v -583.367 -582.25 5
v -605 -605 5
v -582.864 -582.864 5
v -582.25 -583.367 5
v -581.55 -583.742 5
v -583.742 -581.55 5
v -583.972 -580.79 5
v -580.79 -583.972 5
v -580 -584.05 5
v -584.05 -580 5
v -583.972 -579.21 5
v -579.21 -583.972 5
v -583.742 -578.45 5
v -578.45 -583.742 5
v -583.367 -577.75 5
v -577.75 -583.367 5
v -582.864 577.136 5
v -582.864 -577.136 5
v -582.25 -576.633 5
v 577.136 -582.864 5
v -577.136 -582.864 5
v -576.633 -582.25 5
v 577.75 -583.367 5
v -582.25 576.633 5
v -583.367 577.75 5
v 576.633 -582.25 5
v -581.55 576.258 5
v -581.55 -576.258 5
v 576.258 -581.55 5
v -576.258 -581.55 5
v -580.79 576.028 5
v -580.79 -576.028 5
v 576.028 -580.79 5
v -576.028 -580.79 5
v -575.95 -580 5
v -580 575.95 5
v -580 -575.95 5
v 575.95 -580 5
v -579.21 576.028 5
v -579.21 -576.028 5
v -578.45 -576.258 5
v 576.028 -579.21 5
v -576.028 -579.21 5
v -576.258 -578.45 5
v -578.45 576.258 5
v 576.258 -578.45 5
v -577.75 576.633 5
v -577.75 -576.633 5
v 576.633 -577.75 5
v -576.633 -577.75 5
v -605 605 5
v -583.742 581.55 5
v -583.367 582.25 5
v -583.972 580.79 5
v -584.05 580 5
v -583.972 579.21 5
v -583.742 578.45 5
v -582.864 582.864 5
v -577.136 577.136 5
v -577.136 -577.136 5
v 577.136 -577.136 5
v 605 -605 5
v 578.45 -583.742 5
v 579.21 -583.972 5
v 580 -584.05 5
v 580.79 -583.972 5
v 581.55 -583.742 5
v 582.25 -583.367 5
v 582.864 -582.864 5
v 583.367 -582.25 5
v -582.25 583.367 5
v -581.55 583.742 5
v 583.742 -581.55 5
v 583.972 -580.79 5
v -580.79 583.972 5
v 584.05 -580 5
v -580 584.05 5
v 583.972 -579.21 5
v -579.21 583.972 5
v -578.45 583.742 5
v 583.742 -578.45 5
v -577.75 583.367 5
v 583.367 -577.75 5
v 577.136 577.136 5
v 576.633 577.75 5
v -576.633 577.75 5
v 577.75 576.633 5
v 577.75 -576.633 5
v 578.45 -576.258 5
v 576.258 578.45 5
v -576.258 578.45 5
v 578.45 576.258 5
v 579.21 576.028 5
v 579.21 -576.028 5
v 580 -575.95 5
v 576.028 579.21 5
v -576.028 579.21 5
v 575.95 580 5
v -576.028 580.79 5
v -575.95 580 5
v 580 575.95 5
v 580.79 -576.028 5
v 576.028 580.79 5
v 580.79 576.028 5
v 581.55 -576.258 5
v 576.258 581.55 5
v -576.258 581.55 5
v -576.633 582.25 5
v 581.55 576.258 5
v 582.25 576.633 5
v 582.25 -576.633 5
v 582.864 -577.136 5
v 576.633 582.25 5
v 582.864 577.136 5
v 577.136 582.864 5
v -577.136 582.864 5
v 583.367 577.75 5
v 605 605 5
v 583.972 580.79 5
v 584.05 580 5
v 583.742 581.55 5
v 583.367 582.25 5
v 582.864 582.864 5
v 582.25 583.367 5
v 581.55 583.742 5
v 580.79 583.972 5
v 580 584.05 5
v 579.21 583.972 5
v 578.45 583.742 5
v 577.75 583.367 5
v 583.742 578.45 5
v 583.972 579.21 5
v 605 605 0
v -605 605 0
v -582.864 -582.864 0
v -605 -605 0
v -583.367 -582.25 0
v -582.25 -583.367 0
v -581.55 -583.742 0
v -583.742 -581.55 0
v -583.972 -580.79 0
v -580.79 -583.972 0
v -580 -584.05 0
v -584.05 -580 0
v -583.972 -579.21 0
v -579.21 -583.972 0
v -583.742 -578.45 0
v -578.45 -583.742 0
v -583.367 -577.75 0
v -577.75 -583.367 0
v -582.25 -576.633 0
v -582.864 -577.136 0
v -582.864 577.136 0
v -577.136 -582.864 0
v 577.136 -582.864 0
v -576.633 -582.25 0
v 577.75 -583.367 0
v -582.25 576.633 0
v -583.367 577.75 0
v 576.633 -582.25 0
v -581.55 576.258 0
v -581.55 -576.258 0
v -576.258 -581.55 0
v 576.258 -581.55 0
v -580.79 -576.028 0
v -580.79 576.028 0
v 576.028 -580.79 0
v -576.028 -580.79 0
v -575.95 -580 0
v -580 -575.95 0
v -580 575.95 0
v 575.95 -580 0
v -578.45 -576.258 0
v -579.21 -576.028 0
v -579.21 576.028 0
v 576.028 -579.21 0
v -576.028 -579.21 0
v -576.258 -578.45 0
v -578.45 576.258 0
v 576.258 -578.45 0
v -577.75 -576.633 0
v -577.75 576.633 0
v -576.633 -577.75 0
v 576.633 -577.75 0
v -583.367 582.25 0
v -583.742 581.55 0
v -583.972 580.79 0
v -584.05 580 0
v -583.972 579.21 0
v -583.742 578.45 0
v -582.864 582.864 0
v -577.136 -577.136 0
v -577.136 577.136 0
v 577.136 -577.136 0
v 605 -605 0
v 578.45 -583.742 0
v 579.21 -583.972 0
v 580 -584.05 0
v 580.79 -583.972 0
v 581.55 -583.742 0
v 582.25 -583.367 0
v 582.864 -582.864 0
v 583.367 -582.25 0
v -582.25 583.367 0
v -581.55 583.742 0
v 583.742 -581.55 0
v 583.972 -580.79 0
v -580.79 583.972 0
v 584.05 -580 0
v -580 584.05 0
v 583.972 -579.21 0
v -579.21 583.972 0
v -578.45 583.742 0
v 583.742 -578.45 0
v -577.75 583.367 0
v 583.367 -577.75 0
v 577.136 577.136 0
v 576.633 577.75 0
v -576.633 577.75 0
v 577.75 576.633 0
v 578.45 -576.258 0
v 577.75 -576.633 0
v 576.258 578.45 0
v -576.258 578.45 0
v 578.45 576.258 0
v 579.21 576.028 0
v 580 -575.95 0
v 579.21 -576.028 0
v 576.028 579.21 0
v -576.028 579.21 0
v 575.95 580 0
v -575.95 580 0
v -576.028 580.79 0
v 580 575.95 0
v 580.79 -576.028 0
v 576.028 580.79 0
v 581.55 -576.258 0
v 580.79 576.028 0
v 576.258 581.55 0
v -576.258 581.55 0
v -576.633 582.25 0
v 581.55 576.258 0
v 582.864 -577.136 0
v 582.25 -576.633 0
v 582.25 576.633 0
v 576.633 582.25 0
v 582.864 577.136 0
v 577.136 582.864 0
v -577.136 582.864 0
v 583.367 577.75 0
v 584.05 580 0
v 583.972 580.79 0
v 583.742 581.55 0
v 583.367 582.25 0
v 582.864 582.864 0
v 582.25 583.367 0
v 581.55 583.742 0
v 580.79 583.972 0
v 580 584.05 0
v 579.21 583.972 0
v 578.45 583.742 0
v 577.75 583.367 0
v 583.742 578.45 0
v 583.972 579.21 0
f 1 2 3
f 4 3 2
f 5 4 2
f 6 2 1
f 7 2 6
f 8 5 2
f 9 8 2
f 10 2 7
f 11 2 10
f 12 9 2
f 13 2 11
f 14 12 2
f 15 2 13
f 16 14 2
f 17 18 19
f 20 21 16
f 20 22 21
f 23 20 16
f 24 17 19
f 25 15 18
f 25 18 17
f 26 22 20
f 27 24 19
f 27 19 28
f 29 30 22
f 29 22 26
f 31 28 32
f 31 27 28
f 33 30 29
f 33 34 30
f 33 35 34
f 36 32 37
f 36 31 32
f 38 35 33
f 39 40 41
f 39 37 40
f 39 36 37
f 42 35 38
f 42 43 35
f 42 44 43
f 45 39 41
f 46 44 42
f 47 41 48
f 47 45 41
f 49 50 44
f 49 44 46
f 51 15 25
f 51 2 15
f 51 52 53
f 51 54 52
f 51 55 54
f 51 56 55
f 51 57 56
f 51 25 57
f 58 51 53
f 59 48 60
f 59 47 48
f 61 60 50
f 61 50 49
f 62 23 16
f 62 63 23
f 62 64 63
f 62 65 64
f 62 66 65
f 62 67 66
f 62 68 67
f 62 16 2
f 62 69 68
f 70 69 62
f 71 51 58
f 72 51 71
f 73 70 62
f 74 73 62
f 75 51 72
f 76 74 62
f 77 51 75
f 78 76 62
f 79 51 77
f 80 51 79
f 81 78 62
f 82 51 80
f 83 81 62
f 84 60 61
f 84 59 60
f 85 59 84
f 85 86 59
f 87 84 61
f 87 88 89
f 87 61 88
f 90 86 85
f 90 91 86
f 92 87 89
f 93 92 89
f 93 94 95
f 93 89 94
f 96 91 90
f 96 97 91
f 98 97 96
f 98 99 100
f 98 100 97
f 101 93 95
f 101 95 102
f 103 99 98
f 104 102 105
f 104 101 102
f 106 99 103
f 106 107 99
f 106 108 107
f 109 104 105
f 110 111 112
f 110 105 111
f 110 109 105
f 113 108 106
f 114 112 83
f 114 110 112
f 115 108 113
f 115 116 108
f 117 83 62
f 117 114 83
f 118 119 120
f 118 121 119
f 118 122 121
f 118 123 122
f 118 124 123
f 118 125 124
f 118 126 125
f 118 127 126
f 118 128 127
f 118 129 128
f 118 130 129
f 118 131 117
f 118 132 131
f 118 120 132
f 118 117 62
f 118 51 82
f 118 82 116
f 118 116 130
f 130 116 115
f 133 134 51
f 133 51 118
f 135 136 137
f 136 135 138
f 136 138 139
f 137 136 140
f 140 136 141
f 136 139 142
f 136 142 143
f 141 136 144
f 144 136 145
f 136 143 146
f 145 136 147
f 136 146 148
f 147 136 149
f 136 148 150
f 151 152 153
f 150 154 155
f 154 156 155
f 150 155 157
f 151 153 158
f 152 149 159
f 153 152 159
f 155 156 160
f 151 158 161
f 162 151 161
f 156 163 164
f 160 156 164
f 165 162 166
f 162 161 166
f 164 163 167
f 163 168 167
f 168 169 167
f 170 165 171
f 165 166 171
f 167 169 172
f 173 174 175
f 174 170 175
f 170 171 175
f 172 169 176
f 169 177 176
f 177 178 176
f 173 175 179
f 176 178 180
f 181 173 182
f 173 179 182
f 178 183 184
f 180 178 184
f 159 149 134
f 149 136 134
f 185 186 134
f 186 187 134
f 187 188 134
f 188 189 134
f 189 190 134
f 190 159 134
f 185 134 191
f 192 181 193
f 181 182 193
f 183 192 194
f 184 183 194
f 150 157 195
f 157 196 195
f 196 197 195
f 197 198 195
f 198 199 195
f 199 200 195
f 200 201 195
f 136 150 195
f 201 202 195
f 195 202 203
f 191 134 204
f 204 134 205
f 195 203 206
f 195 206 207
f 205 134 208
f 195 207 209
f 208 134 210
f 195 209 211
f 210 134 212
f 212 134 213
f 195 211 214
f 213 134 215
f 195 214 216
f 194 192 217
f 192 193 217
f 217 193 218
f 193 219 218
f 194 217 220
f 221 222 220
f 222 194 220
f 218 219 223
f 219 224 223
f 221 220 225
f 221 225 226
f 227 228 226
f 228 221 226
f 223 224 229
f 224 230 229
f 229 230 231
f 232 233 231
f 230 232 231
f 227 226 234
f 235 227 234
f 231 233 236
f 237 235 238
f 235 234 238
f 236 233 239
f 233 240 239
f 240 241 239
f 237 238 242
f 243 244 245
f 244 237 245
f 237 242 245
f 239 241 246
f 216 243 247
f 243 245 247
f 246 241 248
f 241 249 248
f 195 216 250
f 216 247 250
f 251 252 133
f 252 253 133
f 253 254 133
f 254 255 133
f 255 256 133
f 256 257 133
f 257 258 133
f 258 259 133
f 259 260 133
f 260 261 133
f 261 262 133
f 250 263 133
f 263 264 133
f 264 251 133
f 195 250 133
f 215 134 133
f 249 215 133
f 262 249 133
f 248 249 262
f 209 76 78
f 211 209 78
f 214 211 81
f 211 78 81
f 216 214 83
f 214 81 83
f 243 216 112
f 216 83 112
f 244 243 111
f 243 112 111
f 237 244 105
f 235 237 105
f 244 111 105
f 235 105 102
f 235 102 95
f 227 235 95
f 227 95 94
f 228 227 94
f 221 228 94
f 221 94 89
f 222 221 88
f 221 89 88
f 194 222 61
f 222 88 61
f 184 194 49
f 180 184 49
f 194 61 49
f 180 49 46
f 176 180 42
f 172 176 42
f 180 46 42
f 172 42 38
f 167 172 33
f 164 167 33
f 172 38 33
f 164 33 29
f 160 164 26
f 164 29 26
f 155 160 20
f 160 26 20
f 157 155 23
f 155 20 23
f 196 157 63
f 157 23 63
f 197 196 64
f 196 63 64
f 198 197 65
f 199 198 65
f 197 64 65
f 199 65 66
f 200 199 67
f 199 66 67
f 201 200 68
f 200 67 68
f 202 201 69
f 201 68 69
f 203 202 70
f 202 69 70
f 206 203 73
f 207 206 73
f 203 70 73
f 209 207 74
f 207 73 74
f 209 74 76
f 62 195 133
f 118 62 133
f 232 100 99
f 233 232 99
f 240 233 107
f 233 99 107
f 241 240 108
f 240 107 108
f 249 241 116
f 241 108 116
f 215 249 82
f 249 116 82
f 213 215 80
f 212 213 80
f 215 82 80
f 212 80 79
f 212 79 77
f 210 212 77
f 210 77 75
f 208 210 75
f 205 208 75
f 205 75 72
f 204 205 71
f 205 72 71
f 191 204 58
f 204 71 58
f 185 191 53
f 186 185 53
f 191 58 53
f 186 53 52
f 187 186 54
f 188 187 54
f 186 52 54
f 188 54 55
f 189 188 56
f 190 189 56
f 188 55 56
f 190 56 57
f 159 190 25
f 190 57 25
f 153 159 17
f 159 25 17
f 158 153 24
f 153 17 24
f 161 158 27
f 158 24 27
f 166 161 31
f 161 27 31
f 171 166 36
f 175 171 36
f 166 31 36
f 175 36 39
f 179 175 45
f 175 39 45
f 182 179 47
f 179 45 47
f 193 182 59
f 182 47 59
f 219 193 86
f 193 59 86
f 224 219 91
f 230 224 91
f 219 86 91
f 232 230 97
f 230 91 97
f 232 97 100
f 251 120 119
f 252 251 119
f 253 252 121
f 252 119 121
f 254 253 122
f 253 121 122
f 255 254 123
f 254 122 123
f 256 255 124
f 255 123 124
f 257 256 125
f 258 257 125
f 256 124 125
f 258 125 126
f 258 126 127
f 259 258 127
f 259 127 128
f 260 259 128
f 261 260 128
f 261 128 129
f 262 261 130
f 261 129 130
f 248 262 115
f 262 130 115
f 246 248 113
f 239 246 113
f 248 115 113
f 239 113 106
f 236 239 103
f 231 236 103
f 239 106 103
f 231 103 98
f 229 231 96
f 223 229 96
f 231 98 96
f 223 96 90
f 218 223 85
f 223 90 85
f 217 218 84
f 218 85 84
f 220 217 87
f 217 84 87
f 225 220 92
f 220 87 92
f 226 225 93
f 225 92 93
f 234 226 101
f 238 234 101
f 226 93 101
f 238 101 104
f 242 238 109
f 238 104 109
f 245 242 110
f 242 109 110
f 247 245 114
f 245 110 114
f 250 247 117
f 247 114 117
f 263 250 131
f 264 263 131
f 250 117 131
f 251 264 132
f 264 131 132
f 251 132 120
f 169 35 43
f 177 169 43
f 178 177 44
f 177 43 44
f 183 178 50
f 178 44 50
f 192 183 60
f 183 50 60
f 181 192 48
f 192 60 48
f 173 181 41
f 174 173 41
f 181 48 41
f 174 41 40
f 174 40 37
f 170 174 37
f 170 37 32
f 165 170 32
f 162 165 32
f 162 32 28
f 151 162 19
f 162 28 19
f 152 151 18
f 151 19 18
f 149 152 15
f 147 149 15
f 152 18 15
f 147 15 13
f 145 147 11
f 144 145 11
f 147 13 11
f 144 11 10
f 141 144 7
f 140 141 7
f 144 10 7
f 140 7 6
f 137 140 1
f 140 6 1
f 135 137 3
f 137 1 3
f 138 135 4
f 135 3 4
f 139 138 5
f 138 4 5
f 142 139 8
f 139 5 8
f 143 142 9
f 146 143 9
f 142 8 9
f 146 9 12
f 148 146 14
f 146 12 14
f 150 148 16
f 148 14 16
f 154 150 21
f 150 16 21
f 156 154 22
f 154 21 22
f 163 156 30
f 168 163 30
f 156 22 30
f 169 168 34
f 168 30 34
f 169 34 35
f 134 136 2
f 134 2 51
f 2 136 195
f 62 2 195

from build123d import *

# Parameters (mm, degrees)
SKETCH_1_W                  = 1210
SKETCH_1_H                  = 1210
EXTRUDE_1_DEPTH             = 5
SKETCH_2_R                  = 4.05
CUT_EXTRUDE_1_DEPTH         = 5
PATTERN_LINEAR_1_COUNT      = 2
PATTERN_LINEAR_1_PITCH      = 1160
PATTERN_LINEAR_1_COUNT_DIR2 = 2
PATTERN_LINEAR_1_PITCH_DIR2 = 1160


with BuildPart() as part:
    # 草图1 → 凸台-拉伸1 (new body)
    with BuildSketch(Plane.XY):
        Rectangle(SKETCH_1_W, SKETCH_1_H)
    extrude(amount=EXTRUDE_1_DEPTH)

    # 草图2 → 切除-拉伸1 (cut)
    with BuildSketch(Plane.XY.offset(5)):
        with Locations((580, 580)):
            Circle(SKETCH_2_R)
    cut_extrude_1 = extrude(amount=-CUT_EXTRUDE_1_DEPTH, mode=Mode.SUBTRACT)

    # 阵列(线性)1: Cut-Extrude 1 2 × 2
    with Locations(*[(-i * PATTERN_LINEAR_1_PITCH, -j * PATTERN_LINEAR_1_PITCH_DIR2, 0) for i in range(PATTERN_LINEAR_1_COUNT) for j in range(PATTERN_LINEAR_1_COUNT_DIR2) if (i, j) != (0, 0)]):
        add(cut_extrude_1, mode=Mode.SUBTRACT)


solid = part.part
